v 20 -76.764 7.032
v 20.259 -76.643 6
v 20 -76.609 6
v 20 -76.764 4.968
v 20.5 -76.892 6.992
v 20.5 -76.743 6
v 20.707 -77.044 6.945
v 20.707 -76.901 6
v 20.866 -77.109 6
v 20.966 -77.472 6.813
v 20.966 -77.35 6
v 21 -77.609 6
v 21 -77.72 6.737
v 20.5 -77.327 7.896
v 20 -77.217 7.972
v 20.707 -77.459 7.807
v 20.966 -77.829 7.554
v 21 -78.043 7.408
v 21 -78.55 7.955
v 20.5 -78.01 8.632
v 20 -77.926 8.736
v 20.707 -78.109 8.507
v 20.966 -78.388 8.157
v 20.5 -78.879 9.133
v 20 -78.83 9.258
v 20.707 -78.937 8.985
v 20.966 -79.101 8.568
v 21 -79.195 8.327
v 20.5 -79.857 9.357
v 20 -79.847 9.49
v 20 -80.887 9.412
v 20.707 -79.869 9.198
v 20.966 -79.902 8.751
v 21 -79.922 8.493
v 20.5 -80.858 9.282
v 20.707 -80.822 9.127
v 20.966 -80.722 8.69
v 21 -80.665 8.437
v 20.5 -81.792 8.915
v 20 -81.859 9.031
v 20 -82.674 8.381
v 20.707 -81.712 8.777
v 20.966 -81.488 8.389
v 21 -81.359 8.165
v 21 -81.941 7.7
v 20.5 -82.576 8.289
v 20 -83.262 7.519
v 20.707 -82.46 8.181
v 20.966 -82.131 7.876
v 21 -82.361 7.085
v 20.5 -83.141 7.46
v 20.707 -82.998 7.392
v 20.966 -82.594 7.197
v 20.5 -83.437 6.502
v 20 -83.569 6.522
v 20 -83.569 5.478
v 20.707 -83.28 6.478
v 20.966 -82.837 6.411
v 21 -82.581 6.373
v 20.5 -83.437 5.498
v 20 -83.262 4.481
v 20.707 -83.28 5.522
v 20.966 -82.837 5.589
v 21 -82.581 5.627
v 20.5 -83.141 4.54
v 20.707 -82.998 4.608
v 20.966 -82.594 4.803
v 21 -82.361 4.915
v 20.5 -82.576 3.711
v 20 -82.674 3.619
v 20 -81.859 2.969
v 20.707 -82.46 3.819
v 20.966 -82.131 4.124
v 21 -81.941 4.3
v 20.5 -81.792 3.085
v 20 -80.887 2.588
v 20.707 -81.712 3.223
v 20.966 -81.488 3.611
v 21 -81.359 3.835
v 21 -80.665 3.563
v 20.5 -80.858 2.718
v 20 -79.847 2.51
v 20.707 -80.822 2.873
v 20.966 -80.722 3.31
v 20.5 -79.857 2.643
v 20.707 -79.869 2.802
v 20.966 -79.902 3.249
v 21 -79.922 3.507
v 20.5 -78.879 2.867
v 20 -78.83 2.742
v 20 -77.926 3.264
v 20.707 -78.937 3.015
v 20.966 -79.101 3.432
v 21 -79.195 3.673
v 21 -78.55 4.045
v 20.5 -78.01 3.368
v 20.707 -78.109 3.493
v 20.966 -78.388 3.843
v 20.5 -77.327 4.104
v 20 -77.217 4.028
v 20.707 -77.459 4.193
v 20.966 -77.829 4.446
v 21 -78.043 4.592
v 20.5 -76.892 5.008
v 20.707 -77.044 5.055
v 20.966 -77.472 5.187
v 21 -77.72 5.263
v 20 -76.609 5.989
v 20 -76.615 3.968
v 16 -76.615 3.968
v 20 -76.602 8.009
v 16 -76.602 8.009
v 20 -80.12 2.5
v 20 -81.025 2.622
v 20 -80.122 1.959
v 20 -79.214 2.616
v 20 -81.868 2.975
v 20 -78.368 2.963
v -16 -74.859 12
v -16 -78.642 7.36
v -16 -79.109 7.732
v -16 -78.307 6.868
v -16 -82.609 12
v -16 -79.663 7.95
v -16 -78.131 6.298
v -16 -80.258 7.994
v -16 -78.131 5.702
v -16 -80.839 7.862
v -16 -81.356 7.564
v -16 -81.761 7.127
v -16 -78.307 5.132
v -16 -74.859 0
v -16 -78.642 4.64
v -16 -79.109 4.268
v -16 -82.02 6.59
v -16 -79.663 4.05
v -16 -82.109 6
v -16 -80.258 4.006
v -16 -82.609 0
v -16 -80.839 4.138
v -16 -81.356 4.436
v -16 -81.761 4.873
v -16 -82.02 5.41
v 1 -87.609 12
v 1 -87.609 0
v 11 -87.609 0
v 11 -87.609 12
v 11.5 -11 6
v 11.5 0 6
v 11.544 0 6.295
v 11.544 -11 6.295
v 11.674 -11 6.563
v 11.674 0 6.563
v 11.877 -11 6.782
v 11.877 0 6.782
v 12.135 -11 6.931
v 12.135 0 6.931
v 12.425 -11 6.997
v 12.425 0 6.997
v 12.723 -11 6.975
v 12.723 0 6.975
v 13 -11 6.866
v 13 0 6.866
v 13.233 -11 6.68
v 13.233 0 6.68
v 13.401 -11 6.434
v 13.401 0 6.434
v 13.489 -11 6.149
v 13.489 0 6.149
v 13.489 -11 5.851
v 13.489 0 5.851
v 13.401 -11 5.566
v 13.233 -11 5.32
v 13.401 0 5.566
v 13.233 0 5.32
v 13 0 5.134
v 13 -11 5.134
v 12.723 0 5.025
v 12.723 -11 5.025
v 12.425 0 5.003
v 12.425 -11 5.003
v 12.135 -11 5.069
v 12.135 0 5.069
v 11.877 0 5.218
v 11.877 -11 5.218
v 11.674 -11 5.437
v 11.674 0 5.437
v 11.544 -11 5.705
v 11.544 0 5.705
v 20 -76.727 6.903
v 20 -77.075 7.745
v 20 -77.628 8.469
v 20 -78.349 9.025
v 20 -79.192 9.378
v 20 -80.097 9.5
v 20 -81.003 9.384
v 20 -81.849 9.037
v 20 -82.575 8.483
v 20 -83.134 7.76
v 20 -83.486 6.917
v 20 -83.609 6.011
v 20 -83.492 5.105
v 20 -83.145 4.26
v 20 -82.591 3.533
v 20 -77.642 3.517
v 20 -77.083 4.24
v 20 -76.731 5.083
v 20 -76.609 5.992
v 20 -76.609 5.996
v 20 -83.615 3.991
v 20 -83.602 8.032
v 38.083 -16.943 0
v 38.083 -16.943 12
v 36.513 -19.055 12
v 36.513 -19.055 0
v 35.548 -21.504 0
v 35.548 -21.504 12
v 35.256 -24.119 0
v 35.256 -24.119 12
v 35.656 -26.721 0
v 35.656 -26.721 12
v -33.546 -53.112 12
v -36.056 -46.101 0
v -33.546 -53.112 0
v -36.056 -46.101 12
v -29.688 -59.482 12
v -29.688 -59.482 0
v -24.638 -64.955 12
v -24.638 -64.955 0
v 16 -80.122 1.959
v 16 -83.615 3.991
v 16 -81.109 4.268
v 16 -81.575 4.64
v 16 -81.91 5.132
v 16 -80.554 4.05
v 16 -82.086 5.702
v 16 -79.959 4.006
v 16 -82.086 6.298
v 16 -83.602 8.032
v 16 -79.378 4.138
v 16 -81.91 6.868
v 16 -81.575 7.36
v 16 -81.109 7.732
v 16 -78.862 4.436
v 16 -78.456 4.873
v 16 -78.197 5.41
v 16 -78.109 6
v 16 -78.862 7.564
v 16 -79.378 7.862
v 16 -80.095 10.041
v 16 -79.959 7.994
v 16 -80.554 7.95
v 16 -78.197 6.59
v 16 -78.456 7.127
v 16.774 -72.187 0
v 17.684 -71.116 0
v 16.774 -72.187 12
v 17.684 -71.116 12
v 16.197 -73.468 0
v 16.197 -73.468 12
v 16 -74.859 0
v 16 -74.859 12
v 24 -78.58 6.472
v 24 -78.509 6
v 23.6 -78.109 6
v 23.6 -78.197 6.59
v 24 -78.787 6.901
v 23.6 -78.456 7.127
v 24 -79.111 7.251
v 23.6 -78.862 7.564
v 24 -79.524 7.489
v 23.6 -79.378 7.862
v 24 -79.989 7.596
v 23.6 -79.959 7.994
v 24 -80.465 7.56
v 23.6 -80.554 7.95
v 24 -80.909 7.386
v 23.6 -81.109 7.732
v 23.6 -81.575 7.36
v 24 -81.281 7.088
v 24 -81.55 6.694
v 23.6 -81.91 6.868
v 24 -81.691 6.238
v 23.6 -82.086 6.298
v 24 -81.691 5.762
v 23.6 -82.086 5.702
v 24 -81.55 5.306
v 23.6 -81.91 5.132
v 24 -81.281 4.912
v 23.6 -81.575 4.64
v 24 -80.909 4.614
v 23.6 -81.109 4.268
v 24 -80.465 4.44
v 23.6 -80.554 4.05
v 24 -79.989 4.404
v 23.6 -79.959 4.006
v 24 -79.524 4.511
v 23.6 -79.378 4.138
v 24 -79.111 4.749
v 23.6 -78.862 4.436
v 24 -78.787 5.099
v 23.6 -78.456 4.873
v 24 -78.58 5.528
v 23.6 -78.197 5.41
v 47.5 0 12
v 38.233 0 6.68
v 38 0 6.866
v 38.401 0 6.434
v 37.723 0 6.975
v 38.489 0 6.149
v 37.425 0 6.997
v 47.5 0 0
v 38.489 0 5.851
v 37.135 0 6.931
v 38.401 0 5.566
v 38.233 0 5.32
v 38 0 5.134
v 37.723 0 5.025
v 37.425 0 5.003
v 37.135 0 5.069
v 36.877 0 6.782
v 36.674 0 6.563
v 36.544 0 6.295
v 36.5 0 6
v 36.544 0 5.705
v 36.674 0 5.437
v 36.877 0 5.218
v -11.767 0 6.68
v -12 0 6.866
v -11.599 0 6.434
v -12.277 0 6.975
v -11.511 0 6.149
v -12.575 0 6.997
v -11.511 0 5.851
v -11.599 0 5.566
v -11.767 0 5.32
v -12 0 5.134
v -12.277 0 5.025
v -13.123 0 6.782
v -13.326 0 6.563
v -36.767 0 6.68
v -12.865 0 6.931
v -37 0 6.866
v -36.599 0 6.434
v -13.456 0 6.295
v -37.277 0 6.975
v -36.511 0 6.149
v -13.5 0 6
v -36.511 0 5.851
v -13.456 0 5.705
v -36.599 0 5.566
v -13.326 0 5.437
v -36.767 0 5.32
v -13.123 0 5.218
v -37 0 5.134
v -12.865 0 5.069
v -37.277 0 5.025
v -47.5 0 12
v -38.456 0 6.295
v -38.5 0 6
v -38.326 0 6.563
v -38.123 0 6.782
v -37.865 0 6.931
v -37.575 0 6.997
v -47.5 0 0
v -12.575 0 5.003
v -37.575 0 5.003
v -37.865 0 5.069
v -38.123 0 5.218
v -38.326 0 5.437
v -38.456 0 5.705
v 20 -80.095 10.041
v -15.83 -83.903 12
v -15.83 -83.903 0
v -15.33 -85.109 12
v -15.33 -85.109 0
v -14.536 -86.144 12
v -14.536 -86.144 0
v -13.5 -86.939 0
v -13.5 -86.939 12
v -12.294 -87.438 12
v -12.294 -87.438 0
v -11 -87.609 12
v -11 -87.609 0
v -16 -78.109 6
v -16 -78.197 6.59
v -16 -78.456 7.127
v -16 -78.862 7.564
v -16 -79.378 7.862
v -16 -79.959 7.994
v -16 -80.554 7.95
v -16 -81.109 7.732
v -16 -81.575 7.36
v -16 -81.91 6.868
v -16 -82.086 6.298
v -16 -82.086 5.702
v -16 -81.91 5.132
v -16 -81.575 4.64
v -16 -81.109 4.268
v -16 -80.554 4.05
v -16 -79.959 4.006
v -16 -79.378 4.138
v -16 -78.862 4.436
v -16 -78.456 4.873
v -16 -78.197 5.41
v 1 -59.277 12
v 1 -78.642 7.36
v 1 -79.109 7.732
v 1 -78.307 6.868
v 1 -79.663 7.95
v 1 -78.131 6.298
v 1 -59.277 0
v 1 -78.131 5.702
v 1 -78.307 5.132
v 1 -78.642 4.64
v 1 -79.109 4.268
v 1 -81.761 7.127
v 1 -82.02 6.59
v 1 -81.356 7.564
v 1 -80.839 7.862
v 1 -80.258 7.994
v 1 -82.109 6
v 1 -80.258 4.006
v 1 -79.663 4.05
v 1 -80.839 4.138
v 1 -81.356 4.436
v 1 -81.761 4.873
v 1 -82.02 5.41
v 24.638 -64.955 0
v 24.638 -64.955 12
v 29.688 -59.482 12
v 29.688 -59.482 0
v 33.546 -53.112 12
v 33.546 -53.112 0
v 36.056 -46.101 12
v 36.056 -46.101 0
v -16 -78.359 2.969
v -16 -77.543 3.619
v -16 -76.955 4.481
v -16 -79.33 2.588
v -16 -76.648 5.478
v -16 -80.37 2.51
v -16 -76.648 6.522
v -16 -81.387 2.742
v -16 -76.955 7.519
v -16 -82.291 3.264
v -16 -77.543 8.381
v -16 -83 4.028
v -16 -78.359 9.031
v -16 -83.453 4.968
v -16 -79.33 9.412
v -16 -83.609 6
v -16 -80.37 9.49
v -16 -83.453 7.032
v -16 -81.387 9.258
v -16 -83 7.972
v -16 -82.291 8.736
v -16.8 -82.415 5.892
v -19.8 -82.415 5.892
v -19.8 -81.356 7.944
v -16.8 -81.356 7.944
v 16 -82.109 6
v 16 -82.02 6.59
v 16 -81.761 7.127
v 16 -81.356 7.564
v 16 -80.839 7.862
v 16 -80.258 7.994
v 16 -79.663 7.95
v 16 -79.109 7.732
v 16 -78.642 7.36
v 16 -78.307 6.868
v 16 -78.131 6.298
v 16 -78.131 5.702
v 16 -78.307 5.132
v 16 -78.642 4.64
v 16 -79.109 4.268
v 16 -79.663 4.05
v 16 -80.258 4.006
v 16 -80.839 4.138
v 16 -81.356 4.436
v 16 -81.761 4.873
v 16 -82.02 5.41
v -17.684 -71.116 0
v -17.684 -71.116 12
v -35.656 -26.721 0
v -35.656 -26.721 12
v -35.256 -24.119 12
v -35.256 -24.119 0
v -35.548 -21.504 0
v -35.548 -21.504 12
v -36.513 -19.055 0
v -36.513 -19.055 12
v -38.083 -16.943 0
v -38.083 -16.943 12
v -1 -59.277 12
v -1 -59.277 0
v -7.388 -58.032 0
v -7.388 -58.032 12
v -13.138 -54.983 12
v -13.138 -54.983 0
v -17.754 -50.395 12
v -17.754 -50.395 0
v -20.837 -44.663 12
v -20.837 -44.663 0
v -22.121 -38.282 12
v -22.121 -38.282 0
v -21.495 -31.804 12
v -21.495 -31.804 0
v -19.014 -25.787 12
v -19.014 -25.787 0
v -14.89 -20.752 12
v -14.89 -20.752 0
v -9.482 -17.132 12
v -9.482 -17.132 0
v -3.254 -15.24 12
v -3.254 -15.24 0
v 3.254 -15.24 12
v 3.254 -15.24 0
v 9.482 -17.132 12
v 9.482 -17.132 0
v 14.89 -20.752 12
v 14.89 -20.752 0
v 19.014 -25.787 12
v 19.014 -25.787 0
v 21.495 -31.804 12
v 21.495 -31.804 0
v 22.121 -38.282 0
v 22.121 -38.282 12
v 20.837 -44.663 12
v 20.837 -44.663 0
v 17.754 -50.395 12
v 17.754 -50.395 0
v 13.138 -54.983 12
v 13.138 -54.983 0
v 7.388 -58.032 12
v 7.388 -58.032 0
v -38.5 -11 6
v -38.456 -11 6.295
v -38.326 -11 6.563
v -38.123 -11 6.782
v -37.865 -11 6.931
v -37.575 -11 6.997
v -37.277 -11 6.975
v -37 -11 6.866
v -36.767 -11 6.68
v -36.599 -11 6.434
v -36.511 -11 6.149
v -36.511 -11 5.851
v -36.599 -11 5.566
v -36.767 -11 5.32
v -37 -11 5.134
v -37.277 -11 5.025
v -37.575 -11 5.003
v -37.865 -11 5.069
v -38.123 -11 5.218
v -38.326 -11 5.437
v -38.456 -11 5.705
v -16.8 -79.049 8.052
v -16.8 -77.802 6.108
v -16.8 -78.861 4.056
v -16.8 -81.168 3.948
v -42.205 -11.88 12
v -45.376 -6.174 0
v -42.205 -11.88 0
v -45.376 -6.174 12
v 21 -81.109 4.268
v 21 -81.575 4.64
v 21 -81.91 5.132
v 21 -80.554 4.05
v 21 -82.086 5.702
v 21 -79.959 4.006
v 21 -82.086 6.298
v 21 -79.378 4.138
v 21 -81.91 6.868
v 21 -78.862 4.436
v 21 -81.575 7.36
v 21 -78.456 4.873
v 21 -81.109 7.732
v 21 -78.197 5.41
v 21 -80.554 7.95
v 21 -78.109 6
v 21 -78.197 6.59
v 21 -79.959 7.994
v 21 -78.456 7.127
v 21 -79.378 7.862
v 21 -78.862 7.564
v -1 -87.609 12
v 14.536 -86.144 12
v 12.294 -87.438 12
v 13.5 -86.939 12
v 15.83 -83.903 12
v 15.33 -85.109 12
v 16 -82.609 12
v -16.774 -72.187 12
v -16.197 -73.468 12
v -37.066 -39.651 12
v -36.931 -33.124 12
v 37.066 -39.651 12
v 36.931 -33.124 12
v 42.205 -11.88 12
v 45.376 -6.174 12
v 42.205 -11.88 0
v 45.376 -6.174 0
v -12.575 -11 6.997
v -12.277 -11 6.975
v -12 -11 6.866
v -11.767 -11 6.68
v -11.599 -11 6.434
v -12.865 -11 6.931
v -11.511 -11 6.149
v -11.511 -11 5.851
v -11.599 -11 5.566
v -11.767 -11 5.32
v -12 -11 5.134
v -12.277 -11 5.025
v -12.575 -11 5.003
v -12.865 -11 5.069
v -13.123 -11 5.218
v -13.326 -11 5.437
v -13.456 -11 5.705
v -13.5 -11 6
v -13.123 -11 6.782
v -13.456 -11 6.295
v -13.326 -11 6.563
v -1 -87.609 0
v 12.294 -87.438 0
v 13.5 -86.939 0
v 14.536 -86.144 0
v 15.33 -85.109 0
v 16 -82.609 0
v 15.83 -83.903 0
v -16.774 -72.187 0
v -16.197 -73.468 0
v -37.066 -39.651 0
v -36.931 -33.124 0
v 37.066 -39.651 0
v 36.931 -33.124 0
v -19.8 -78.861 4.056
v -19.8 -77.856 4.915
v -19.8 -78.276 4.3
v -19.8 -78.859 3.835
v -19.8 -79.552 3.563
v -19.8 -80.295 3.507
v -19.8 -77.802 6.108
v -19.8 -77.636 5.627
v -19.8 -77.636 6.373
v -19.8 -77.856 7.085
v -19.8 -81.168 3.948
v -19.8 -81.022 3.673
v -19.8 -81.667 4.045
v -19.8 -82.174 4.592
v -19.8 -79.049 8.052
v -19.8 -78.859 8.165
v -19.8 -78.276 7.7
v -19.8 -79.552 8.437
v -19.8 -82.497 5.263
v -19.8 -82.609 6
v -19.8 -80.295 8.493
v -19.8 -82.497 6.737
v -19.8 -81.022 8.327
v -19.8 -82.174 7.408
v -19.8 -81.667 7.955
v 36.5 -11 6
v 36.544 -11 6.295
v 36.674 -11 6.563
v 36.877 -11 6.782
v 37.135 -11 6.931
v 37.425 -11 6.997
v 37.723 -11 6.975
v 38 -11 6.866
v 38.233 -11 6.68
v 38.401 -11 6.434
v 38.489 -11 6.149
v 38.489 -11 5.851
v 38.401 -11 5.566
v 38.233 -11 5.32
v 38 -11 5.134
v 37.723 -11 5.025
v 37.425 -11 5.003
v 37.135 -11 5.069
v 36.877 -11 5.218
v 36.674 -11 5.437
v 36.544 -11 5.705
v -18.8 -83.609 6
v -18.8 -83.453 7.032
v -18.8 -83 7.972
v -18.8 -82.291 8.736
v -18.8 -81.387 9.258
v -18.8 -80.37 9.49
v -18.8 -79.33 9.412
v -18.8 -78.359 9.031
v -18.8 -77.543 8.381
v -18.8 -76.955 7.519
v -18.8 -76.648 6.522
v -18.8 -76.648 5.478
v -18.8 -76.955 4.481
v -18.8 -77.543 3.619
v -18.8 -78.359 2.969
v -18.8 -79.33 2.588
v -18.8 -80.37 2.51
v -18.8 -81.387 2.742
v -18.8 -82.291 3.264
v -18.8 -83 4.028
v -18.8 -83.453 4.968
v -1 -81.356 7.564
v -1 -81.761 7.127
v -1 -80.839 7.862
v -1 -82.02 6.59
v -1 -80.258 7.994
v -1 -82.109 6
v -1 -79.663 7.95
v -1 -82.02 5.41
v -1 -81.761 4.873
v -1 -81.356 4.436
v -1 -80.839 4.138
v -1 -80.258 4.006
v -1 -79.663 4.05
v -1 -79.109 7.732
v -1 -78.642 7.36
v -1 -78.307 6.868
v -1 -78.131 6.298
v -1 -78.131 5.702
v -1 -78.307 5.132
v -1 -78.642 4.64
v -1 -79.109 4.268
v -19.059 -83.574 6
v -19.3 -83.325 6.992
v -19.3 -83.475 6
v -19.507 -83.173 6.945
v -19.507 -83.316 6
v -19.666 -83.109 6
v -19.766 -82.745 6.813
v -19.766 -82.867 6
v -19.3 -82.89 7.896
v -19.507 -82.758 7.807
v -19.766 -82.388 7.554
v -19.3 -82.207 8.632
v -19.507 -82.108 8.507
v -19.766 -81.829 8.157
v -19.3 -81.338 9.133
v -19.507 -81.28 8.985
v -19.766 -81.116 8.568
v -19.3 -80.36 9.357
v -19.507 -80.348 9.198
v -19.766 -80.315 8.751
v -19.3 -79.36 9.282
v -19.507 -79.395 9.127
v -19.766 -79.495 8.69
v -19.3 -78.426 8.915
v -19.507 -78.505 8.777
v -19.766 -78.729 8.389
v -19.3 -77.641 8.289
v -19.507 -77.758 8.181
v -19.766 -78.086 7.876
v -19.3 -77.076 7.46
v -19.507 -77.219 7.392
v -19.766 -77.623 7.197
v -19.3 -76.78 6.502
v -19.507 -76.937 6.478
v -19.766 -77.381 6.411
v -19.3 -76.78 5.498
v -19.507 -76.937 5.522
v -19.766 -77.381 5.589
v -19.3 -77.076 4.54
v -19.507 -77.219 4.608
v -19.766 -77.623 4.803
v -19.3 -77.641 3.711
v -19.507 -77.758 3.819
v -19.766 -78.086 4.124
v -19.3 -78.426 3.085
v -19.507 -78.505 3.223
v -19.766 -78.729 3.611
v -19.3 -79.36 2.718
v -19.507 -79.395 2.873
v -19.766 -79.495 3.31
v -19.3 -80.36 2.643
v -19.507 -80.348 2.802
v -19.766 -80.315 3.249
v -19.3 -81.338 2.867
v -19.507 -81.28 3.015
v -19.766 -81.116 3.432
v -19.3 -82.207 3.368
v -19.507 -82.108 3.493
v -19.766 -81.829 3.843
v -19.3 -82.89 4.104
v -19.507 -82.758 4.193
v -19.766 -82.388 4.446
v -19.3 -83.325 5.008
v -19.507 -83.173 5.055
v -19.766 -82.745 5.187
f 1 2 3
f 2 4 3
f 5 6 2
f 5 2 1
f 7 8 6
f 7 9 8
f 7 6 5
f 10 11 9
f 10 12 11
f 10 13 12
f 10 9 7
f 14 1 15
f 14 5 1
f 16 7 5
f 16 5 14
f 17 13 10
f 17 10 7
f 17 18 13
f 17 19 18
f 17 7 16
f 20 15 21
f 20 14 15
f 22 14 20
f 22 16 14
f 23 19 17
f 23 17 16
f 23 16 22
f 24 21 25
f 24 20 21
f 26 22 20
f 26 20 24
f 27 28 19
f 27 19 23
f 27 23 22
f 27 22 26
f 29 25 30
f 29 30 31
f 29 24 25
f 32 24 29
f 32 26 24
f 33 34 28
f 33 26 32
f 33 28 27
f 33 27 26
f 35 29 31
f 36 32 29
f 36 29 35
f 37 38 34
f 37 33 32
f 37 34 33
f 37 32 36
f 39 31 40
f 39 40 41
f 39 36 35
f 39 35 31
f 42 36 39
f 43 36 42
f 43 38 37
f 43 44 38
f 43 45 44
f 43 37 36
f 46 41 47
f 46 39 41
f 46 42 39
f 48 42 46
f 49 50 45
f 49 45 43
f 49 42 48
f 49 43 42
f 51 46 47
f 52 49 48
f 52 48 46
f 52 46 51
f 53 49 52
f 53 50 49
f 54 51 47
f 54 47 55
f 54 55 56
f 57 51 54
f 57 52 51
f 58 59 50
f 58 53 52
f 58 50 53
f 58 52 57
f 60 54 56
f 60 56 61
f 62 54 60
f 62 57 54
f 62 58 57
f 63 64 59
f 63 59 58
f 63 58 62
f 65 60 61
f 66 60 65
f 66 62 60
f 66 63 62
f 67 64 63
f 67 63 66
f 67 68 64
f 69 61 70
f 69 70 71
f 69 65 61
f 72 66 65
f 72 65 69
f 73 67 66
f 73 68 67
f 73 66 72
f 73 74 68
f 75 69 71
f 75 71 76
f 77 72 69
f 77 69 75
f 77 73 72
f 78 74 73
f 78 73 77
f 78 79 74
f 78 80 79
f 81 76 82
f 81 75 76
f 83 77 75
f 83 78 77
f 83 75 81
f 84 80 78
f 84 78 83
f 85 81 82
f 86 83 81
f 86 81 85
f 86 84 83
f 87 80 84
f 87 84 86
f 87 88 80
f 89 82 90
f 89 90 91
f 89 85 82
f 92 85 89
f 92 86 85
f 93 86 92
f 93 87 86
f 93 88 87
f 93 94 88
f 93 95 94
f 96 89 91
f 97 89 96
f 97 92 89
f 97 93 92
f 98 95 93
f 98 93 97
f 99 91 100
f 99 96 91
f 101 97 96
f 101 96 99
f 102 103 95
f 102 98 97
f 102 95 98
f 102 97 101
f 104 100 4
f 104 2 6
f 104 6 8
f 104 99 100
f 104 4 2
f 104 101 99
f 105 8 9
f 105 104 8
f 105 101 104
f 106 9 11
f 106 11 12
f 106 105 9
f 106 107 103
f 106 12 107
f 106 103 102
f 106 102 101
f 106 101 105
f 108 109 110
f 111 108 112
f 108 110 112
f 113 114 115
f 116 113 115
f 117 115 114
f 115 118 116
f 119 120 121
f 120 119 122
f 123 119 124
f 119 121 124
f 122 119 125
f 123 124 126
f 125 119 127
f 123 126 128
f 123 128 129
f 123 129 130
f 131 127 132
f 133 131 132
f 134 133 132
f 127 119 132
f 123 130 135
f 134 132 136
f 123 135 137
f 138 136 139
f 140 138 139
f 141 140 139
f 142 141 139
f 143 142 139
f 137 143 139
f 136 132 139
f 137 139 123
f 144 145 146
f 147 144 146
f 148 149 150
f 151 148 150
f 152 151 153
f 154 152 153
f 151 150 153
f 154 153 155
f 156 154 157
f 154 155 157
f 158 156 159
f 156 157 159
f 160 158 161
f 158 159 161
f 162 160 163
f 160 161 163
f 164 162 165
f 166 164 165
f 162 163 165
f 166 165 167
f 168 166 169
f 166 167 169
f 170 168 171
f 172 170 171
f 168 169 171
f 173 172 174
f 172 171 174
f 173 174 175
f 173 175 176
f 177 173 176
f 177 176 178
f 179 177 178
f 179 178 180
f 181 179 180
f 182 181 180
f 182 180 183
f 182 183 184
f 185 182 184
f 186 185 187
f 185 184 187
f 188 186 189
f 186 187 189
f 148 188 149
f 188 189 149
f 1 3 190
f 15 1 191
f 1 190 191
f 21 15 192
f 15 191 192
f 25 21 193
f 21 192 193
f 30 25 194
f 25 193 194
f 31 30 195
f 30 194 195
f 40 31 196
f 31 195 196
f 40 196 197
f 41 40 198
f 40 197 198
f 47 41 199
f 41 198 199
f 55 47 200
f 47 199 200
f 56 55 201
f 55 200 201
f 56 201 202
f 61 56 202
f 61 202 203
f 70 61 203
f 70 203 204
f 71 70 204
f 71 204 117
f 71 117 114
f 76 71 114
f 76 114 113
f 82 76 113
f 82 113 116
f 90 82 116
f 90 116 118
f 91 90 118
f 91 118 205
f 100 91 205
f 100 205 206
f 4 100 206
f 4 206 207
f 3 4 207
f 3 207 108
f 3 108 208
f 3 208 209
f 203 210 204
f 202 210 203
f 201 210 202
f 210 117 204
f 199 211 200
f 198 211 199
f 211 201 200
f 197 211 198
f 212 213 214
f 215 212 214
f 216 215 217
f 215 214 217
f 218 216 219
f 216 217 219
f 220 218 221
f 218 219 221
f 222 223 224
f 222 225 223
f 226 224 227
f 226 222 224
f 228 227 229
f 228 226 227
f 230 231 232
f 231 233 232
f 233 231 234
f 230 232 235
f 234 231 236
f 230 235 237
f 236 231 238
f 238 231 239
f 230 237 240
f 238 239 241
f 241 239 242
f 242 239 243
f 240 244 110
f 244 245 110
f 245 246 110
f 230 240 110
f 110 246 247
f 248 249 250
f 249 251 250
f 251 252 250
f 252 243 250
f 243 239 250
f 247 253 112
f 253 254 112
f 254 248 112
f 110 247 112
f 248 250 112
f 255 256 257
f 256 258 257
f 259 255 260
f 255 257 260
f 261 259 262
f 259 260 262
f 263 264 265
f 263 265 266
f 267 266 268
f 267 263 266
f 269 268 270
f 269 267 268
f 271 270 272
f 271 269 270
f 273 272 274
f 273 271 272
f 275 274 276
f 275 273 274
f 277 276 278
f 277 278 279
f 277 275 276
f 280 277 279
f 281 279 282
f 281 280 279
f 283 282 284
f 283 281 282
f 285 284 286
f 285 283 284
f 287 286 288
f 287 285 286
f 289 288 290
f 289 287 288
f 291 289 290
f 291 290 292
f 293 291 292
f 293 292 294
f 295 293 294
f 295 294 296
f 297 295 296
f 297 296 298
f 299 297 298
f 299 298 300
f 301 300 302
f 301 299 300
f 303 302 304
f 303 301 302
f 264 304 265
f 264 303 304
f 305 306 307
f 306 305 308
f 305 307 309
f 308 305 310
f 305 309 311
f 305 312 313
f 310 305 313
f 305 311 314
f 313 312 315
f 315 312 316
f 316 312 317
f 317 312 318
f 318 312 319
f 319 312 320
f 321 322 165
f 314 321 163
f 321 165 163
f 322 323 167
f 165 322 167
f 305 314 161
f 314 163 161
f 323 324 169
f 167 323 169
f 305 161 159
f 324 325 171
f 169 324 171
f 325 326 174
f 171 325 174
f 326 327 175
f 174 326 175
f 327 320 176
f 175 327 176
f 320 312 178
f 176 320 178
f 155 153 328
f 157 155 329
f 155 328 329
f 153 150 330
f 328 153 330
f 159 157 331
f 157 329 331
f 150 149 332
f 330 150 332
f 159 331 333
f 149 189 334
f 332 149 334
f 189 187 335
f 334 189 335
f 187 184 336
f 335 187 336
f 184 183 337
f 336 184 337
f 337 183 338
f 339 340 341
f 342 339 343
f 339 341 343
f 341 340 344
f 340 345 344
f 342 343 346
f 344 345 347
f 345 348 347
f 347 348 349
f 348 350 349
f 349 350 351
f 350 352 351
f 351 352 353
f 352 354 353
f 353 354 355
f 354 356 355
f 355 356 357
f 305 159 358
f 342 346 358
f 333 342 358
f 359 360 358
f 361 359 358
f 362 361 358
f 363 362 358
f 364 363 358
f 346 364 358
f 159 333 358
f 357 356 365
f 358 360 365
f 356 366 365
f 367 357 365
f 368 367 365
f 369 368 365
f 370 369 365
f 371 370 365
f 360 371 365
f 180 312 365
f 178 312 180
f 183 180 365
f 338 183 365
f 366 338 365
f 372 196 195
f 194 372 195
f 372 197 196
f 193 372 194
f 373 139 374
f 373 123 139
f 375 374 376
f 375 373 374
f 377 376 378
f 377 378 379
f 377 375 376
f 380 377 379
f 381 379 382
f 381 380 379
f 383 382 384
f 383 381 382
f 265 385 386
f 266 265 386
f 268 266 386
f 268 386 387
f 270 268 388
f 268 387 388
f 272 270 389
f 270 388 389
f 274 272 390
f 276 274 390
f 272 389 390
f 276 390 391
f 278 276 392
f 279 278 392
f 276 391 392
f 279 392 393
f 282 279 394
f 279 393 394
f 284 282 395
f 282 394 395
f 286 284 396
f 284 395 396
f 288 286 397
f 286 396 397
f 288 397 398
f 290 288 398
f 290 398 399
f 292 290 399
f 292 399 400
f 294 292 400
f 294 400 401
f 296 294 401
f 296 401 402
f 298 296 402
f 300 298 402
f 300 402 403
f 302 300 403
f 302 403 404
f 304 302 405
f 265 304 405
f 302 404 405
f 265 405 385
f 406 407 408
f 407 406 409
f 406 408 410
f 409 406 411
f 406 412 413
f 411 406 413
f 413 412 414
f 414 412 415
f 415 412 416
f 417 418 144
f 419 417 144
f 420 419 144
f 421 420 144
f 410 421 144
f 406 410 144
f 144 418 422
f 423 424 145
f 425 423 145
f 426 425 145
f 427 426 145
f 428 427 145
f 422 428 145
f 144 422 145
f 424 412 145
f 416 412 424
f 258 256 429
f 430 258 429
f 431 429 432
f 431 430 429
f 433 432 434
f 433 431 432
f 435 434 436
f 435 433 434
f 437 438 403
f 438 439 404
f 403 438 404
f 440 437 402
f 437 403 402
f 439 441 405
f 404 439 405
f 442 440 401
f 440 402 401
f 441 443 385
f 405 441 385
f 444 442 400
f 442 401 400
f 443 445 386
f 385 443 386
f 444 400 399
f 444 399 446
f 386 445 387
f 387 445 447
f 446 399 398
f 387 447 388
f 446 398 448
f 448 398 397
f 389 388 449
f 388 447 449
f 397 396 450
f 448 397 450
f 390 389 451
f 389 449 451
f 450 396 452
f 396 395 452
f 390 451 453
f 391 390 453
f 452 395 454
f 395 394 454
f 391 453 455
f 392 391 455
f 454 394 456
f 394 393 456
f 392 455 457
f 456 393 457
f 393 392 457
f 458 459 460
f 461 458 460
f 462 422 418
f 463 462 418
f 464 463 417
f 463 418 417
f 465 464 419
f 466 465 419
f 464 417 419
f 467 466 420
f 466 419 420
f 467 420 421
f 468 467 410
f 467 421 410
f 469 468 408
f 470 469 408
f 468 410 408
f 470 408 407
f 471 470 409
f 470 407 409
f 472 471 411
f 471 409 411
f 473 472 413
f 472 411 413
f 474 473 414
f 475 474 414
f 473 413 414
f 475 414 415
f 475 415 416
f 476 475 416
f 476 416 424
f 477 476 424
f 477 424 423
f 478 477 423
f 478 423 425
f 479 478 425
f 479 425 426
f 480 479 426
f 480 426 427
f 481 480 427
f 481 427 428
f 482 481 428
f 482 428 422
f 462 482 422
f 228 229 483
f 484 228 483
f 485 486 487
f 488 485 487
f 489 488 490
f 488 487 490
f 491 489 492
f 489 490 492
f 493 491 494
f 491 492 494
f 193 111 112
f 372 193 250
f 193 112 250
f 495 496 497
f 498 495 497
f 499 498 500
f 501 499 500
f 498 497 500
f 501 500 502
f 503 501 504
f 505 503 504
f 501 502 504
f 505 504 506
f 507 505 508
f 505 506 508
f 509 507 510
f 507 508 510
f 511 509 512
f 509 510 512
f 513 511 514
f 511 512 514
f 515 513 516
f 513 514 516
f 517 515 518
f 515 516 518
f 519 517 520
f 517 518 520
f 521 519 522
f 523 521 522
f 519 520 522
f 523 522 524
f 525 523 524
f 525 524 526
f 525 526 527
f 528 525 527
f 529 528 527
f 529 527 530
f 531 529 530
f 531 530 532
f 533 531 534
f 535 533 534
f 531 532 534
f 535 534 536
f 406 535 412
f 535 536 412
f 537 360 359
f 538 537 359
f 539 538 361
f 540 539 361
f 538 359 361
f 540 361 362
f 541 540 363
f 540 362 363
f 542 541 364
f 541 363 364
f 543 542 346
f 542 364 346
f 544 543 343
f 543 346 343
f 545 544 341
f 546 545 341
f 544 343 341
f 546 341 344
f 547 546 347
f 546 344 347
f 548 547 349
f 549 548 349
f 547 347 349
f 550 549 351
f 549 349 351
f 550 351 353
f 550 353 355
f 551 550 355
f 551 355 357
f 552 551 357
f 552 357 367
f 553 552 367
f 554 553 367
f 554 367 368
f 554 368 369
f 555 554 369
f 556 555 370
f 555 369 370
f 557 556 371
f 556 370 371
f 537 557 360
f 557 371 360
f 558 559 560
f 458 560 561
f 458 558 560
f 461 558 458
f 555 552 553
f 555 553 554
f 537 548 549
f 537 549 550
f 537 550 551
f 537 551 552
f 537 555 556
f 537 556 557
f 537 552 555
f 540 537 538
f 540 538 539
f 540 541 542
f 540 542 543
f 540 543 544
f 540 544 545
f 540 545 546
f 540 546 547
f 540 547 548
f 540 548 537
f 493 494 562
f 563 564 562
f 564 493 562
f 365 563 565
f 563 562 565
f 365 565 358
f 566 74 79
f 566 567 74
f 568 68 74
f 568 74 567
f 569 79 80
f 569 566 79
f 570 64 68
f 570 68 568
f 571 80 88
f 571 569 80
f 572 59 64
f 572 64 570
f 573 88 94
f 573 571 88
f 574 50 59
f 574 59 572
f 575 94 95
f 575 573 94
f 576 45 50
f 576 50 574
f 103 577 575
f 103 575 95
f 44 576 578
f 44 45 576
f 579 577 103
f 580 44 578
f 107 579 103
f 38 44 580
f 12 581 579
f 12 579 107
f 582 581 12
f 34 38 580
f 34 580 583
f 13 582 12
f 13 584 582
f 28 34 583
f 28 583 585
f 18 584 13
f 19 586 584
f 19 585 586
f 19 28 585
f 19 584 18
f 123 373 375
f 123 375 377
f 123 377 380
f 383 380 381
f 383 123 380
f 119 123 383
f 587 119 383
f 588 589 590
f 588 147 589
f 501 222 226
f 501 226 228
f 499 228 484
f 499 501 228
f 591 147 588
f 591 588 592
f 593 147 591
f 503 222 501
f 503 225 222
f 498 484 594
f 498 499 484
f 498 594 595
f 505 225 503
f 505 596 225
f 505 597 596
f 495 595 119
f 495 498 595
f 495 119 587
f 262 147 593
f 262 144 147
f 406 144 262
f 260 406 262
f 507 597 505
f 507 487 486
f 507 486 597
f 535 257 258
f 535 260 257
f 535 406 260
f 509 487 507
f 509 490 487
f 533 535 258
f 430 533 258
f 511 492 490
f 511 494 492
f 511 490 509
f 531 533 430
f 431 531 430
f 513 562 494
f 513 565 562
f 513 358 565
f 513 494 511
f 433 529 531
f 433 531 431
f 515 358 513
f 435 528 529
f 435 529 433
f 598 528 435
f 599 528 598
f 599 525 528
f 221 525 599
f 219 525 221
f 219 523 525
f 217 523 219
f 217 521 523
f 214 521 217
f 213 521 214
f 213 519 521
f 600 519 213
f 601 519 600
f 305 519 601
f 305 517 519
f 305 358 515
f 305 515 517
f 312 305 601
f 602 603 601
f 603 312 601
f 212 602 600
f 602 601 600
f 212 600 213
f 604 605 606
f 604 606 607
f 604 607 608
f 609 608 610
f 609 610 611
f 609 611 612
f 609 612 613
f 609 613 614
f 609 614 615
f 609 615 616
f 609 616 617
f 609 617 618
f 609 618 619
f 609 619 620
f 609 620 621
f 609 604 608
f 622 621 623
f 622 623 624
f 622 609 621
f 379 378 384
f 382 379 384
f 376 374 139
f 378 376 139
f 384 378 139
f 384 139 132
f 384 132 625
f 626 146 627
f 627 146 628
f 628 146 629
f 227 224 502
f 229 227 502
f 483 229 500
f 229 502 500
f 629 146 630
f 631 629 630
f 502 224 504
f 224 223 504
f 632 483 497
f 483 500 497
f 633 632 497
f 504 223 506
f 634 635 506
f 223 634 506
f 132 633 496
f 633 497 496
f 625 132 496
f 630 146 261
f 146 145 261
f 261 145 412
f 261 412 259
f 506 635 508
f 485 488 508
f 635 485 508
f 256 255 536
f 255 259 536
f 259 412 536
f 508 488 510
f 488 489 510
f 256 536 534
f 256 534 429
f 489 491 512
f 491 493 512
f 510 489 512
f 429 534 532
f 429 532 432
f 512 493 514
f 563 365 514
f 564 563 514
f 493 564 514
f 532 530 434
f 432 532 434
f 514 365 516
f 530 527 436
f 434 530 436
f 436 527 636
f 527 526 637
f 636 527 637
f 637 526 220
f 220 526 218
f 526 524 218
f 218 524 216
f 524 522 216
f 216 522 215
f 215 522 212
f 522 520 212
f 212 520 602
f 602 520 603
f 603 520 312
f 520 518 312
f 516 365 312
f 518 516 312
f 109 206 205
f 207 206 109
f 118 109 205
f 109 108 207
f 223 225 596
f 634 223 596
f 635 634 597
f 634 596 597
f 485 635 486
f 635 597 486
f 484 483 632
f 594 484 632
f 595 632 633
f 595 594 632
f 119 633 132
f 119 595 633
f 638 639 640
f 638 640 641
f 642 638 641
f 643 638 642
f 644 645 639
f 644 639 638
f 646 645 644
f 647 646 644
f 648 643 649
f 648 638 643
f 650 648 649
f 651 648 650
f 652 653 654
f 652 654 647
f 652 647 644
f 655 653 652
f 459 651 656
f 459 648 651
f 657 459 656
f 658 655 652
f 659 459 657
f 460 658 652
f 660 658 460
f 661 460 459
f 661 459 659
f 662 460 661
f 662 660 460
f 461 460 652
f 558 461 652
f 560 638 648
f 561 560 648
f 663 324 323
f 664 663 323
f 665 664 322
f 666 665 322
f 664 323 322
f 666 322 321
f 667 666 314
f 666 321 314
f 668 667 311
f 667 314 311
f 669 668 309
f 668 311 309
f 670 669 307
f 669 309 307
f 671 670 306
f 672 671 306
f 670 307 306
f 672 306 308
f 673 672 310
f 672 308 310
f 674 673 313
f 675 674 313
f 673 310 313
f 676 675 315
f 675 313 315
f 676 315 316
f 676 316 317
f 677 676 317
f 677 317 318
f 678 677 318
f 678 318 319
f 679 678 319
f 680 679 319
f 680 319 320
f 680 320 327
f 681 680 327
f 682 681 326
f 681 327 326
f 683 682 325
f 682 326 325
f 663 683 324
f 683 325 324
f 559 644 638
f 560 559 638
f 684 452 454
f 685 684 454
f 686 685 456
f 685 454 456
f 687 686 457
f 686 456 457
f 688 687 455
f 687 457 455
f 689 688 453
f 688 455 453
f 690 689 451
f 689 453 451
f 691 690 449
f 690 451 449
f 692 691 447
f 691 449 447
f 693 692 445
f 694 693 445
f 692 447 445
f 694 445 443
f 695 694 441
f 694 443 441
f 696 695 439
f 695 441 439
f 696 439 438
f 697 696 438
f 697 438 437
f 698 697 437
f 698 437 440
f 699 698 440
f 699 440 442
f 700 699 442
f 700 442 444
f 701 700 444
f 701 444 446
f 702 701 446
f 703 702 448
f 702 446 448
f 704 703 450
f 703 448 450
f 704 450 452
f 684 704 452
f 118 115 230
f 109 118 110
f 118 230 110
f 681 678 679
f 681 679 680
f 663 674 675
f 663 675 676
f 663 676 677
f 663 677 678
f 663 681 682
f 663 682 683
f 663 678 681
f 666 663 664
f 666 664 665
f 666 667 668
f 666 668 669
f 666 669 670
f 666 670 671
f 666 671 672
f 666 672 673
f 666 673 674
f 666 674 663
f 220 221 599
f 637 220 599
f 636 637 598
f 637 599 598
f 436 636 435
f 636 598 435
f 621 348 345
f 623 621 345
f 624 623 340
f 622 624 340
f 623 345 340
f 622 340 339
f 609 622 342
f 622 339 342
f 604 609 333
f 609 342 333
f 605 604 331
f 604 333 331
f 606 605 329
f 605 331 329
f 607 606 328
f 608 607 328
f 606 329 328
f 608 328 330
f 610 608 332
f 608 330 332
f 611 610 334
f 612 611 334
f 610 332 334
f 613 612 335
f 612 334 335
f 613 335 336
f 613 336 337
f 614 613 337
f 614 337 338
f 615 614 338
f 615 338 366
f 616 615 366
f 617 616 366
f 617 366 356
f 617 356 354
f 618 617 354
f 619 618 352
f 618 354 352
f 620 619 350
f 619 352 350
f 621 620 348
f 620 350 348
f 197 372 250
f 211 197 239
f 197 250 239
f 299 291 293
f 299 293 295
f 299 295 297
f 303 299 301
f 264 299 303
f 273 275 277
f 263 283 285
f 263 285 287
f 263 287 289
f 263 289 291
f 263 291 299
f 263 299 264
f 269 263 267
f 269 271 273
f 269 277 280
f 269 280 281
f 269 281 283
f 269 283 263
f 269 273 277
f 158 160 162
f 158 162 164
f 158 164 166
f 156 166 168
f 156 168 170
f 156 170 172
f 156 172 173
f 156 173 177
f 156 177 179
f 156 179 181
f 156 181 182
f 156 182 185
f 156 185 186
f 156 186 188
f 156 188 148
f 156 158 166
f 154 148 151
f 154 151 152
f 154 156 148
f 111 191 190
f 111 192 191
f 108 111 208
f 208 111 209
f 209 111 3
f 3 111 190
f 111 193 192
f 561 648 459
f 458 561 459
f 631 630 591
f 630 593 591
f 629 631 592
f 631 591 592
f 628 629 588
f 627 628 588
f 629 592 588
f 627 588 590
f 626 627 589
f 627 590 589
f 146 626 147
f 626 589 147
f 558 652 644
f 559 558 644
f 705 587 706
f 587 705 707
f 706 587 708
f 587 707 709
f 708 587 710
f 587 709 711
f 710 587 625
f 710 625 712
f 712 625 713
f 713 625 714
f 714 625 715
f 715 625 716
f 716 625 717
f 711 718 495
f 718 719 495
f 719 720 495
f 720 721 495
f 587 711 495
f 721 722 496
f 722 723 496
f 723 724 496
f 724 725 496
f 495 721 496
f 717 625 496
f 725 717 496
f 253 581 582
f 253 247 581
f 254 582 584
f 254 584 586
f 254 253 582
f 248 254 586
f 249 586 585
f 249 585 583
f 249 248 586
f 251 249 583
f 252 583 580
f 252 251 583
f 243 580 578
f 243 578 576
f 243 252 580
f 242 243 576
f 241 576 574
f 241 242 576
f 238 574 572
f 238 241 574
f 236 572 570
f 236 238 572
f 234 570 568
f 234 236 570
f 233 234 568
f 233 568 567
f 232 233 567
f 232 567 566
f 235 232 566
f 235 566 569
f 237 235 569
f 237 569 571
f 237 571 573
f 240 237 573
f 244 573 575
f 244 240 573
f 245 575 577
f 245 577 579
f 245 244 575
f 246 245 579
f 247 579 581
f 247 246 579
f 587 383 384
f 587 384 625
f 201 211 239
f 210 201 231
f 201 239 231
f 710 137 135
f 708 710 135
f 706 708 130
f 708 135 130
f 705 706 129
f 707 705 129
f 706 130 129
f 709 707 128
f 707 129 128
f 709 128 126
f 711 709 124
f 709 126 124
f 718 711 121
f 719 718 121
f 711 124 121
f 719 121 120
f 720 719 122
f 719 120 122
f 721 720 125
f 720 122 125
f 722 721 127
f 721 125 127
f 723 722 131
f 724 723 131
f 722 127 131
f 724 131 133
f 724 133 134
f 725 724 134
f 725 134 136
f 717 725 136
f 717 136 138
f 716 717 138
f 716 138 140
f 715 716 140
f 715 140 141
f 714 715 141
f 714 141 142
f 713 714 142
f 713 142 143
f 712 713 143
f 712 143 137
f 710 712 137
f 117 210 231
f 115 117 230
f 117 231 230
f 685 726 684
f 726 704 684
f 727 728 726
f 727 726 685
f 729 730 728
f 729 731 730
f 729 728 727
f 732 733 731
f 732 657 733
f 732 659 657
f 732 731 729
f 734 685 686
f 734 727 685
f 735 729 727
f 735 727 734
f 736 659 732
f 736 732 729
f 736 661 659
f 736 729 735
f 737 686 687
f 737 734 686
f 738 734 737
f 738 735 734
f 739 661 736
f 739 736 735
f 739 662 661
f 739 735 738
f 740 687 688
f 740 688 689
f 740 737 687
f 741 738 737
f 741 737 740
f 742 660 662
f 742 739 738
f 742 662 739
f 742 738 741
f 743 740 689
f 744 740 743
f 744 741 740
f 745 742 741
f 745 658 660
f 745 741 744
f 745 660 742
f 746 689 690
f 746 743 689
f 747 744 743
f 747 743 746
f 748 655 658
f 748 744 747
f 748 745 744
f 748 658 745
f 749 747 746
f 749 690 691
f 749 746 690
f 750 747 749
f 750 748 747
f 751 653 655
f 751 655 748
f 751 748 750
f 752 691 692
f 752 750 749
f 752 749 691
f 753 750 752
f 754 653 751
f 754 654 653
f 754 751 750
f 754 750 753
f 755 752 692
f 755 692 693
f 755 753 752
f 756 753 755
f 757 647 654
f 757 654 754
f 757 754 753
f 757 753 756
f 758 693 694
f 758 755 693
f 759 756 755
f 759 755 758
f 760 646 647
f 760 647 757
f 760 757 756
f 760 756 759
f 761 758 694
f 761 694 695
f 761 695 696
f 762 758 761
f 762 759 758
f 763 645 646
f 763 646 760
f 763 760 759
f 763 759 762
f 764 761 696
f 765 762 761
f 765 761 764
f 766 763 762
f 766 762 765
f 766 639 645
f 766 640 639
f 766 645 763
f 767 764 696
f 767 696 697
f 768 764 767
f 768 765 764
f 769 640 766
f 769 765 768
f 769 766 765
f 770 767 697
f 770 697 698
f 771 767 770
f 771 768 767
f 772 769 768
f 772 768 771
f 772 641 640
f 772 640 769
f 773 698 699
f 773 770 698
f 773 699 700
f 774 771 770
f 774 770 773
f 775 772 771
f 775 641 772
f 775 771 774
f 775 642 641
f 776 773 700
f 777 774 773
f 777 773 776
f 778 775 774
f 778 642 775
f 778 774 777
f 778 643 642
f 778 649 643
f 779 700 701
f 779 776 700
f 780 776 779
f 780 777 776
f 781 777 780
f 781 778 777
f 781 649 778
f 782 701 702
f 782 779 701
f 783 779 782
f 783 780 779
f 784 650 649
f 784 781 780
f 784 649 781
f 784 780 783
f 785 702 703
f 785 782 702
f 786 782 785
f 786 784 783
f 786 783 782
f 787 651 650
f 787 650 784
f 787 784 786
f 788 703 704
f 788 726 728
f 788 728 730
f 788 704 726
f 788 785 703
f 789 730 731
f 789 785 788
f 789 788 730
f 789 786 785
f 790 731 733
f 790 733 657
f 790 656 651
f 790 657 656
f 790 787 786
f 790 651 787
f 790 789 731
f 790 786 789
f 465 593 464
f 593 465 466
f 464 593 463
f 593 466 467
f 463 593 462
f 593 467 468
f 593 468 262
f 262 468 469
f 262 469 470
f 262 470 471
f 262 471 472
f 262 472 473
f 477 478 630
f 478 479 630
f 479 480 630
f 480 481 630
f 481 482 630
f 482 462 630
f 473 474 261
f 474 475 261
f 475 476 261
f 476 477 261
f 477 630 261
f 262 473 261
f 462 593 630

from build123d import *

# Parameters (mm, degrees)
F1_DEPTH  = 12
F2_R      = 37.15
F3_R      = 2
F4_DEPTH  = 63.501
F5_R      = 5
F6_R      = 3.5
F7_DEPTH  = 3.8
F8_R      = 2
F9_DEPTH  = 40
F10_R     = 2
F11_DEPTH = 4
F12_R     = 3.5
F12_R_2   = 2
F13_DEPTH = 1
F14_R     = 0.99999
F15_SIZE  = 0.4
F17_DEPTH = 3
F18_R     = 1
F20_DEPTH = 12.001
F21_R     = 1
F22_DEPTH = 11


# Not quite as in the source:
# - a fillet or chamfer is up to 0.001 mm smaller than in the source, because OpenCascade refuses the exact size


with BuildPart() as f1:
    # F0 (on Top) → F1 (new body)
    with BuildSketch(Plane.XY):
        with BuildLine():
            Line((47.5, 0), (-47.5, 0))
            Line((-47.5, 0), (-33.2750902547, -57.3013205481))
            Line((-33.2750902547, -57.3013205481), (-16, -72.6085300216))
            Line((-16, -72.6085300216), (-16, -87.6085300216))
            Line((-16, -87.6085300216), (-1, -87.6085300216))
            Line((-1, -87.6085300216), (-1, -59.2774151224))
            ThreePointArc((-1, -59.2774151224), (0, -15), (1, -59.2774151224))
            Line((1, -59.2774151224), (1, -87.6085300216))
            Line((1, -87.6085300216), (16, -87.6085300216))
            Line((16, -87.6085300216), (16, -72.6085300216))
            Line((16, -72.6085300216), (33.2750902547, -57.3013205481))
            Line((33.2750902547, -57.3013205481), (47.5, 0))
        make_face()
    extrude(amount=F1_DEPTH)

    # F2
    f2_edges = [f1.edges().sort_by_distance(p)[0] for p in [
        (-33.27509, -57.301321, 6),
        (33.27509, -57.301321, 6),
    ]]
    fillet(f2_edges, radius=F2_R)

    # F3 (on face) → F4 (cut, through all)
    with BuildSketch(Plane(origin=(-16, 0, 0), x_dir=(0, -1, 0), z_dir=(-1, 0, 0))):
        with Locations((80.1085300216, 6)):
            Circle(F3_R)
    extrude(amount=-F4_DEPTH, mode=Mode.SUBTRACT)

    # F5
    f5_edges = [f1.edges().sort_by_distance(p)[0] for p in [
        (-16, -72.60853, 6),
        (-16, -87.60853, 6),
        (16, -87.60853, 6),
        (16, -72.60853, 6),
    ]]
    fillet(f5_edges, radius=F5_R)

    # F19 (on face) → F20 (cut, through all)
    with BuildSketch(Plane.XY.offset(12)):
        with BuildLine():
            ThreePointArc((-38.0832391228, -16.9431848421), (-43.9161727331, -9.0966017337), (-47.5, 0))
            Line((-47.5, 0), (-36.0556124269, -46.1007157545))
            ThreePointArc((-36.0556124269, -46.1007157545), (-37.142105278, -36.3841569879), (-35.6560095209, -26.7206431146))
            ThreePointArc((-35.6560095209, -26.7206431146), (-35.5484448087, -21.5039344632), (-38.0832391228, -16.9431848421))
        make_face()
        with BuildLine():
            ThreePointArc((38.0832391228, -16.9431848421), (35.5484448087, -21.5039344632), (35.6560095209, -26.7206431146))
            ThreePointArc((35.6560095209, -26.7206431146), (37.142105278, -36.3841569879), (36.0556124269, -46.1007157545))
            Line((36.0556124269, -46.1007157545), (47.5, 0))
            ThreePointArc((47.5, 0), (43.9161727331, -9.0966017337), (38.0832391228, -16.9431848421))
        make_face()
    extrude(amount=-F20_DEPTH, mode=Mode.SUBTRACT)

    # F21 (on face) → F22 (cut)
    with BuildSketch(Plane(origin=(0, 0, 0), x_dir=(-1, 0, 0), z_dir=(0, 1, 0))):
        with Locations((-37.5, 6)):
            Circle(F21_R)
        with Locations((-12.5, 6)):
            Circle(F21_R)
        with Locations((12.5, 6)):
            Circle(F21_R)
        with Locations((37.5, 6)):
            Circle(F21_R)
    extrude(amount=-F22_DEPTH, mode=Mode.SUBTRACT)


with BuildPart() as f7:
    # F6 (on face) → F7 (new body)
    with BuildSketch(Plane(origin=(-16, 0, 0), x_dir=(0, -1, 0), z_dir=(-1, 0, 0))):
        with Locations((80.1085300216, 6)):
            Circle(F6_R)
    extrude(amount=F7_DEPTH)

    # F8 (on face) → F9 (join)
    with BuildSketch(Plane.YZ.offset(-16)):
        with Locations((-80.1085300216, 6)):
            Circle(F8_R)
    extrude(amount=F9_DEPTH)

    # F15
    f15_edges = [f7.edges().sort_by_distance(p)[0] for p in [
        (24, -82.10853, 6),
    ]]
    chamfer(f15_edges, length=F15_SIZE)

    # F16 (on face) → F17 (cut)
    with BuildSketch(Plane(origin=(-19.8, 0, 0), x_dir=(0, -1, 0), z_dir=(-1, 0, 0))):
        Polygon((81.1682907283, 3.9481129227), (82.4153967096, 5.8918361553), (81.3556360029, 7.9437232326), (79.0487693149, 8.0518870773), (77.8016633336, 6.1081638447), (78.8614240404, 4.0562767674), align=None)
    extrude(amount=-F17_DEPTH, mode=Mode.SUBTRACT)

    # F18
    f18_edges = [f7.edges().sort_by_distance(p)[0] for p in [
        (-19.8, -76.60853, 6),
    ]]
    fillet(f18_edges, radius=F18_R)


with BuildPart() as f11:
    # F10 (on face) → F11 (new body)
    with BuildSketch(Plane.YZ.offset(16)):
        Polygon((-83.6150630784, 3.9906321255), (-80.1216329251, 1.9585693564), (-76.6150998683, 3.9679372309), (-76.6019969649, 8.0093678745), (-80.0954271181, 10.0414306436), (-83.6019601749, 8.0320627691), align=None)
        with Locations((-80.1085300216, 6)):
            Circle(F10_R, mode=Mode.SUBTRACT)
    extrude(amount=F11_DEPTH)

    # F12 (on face) → F13 (join)
    with BuildSketch(Plane.YZ.offset(20)):
        with Locations((-80.1085300216, 6)):
            Circle(F12_R)
        with Locations((-80.1085300216, 6)):
            Circle(F12_R_2, mode=Mode.SUBTRACT)
    extrude(amount=F13_DEPTH)

    # F14 (radius 1 in the source; OpenCascade refuses exactly that, so slightly less here)
    f14_edges = [f11.edges().sort_by_distance(p)[0] for p in [
        (21, -83.60853, 6),
    ]]
    fillet(f14_edges, radius=F14_R)


solid = Compound([f1.part, f7.part, f11.part])
